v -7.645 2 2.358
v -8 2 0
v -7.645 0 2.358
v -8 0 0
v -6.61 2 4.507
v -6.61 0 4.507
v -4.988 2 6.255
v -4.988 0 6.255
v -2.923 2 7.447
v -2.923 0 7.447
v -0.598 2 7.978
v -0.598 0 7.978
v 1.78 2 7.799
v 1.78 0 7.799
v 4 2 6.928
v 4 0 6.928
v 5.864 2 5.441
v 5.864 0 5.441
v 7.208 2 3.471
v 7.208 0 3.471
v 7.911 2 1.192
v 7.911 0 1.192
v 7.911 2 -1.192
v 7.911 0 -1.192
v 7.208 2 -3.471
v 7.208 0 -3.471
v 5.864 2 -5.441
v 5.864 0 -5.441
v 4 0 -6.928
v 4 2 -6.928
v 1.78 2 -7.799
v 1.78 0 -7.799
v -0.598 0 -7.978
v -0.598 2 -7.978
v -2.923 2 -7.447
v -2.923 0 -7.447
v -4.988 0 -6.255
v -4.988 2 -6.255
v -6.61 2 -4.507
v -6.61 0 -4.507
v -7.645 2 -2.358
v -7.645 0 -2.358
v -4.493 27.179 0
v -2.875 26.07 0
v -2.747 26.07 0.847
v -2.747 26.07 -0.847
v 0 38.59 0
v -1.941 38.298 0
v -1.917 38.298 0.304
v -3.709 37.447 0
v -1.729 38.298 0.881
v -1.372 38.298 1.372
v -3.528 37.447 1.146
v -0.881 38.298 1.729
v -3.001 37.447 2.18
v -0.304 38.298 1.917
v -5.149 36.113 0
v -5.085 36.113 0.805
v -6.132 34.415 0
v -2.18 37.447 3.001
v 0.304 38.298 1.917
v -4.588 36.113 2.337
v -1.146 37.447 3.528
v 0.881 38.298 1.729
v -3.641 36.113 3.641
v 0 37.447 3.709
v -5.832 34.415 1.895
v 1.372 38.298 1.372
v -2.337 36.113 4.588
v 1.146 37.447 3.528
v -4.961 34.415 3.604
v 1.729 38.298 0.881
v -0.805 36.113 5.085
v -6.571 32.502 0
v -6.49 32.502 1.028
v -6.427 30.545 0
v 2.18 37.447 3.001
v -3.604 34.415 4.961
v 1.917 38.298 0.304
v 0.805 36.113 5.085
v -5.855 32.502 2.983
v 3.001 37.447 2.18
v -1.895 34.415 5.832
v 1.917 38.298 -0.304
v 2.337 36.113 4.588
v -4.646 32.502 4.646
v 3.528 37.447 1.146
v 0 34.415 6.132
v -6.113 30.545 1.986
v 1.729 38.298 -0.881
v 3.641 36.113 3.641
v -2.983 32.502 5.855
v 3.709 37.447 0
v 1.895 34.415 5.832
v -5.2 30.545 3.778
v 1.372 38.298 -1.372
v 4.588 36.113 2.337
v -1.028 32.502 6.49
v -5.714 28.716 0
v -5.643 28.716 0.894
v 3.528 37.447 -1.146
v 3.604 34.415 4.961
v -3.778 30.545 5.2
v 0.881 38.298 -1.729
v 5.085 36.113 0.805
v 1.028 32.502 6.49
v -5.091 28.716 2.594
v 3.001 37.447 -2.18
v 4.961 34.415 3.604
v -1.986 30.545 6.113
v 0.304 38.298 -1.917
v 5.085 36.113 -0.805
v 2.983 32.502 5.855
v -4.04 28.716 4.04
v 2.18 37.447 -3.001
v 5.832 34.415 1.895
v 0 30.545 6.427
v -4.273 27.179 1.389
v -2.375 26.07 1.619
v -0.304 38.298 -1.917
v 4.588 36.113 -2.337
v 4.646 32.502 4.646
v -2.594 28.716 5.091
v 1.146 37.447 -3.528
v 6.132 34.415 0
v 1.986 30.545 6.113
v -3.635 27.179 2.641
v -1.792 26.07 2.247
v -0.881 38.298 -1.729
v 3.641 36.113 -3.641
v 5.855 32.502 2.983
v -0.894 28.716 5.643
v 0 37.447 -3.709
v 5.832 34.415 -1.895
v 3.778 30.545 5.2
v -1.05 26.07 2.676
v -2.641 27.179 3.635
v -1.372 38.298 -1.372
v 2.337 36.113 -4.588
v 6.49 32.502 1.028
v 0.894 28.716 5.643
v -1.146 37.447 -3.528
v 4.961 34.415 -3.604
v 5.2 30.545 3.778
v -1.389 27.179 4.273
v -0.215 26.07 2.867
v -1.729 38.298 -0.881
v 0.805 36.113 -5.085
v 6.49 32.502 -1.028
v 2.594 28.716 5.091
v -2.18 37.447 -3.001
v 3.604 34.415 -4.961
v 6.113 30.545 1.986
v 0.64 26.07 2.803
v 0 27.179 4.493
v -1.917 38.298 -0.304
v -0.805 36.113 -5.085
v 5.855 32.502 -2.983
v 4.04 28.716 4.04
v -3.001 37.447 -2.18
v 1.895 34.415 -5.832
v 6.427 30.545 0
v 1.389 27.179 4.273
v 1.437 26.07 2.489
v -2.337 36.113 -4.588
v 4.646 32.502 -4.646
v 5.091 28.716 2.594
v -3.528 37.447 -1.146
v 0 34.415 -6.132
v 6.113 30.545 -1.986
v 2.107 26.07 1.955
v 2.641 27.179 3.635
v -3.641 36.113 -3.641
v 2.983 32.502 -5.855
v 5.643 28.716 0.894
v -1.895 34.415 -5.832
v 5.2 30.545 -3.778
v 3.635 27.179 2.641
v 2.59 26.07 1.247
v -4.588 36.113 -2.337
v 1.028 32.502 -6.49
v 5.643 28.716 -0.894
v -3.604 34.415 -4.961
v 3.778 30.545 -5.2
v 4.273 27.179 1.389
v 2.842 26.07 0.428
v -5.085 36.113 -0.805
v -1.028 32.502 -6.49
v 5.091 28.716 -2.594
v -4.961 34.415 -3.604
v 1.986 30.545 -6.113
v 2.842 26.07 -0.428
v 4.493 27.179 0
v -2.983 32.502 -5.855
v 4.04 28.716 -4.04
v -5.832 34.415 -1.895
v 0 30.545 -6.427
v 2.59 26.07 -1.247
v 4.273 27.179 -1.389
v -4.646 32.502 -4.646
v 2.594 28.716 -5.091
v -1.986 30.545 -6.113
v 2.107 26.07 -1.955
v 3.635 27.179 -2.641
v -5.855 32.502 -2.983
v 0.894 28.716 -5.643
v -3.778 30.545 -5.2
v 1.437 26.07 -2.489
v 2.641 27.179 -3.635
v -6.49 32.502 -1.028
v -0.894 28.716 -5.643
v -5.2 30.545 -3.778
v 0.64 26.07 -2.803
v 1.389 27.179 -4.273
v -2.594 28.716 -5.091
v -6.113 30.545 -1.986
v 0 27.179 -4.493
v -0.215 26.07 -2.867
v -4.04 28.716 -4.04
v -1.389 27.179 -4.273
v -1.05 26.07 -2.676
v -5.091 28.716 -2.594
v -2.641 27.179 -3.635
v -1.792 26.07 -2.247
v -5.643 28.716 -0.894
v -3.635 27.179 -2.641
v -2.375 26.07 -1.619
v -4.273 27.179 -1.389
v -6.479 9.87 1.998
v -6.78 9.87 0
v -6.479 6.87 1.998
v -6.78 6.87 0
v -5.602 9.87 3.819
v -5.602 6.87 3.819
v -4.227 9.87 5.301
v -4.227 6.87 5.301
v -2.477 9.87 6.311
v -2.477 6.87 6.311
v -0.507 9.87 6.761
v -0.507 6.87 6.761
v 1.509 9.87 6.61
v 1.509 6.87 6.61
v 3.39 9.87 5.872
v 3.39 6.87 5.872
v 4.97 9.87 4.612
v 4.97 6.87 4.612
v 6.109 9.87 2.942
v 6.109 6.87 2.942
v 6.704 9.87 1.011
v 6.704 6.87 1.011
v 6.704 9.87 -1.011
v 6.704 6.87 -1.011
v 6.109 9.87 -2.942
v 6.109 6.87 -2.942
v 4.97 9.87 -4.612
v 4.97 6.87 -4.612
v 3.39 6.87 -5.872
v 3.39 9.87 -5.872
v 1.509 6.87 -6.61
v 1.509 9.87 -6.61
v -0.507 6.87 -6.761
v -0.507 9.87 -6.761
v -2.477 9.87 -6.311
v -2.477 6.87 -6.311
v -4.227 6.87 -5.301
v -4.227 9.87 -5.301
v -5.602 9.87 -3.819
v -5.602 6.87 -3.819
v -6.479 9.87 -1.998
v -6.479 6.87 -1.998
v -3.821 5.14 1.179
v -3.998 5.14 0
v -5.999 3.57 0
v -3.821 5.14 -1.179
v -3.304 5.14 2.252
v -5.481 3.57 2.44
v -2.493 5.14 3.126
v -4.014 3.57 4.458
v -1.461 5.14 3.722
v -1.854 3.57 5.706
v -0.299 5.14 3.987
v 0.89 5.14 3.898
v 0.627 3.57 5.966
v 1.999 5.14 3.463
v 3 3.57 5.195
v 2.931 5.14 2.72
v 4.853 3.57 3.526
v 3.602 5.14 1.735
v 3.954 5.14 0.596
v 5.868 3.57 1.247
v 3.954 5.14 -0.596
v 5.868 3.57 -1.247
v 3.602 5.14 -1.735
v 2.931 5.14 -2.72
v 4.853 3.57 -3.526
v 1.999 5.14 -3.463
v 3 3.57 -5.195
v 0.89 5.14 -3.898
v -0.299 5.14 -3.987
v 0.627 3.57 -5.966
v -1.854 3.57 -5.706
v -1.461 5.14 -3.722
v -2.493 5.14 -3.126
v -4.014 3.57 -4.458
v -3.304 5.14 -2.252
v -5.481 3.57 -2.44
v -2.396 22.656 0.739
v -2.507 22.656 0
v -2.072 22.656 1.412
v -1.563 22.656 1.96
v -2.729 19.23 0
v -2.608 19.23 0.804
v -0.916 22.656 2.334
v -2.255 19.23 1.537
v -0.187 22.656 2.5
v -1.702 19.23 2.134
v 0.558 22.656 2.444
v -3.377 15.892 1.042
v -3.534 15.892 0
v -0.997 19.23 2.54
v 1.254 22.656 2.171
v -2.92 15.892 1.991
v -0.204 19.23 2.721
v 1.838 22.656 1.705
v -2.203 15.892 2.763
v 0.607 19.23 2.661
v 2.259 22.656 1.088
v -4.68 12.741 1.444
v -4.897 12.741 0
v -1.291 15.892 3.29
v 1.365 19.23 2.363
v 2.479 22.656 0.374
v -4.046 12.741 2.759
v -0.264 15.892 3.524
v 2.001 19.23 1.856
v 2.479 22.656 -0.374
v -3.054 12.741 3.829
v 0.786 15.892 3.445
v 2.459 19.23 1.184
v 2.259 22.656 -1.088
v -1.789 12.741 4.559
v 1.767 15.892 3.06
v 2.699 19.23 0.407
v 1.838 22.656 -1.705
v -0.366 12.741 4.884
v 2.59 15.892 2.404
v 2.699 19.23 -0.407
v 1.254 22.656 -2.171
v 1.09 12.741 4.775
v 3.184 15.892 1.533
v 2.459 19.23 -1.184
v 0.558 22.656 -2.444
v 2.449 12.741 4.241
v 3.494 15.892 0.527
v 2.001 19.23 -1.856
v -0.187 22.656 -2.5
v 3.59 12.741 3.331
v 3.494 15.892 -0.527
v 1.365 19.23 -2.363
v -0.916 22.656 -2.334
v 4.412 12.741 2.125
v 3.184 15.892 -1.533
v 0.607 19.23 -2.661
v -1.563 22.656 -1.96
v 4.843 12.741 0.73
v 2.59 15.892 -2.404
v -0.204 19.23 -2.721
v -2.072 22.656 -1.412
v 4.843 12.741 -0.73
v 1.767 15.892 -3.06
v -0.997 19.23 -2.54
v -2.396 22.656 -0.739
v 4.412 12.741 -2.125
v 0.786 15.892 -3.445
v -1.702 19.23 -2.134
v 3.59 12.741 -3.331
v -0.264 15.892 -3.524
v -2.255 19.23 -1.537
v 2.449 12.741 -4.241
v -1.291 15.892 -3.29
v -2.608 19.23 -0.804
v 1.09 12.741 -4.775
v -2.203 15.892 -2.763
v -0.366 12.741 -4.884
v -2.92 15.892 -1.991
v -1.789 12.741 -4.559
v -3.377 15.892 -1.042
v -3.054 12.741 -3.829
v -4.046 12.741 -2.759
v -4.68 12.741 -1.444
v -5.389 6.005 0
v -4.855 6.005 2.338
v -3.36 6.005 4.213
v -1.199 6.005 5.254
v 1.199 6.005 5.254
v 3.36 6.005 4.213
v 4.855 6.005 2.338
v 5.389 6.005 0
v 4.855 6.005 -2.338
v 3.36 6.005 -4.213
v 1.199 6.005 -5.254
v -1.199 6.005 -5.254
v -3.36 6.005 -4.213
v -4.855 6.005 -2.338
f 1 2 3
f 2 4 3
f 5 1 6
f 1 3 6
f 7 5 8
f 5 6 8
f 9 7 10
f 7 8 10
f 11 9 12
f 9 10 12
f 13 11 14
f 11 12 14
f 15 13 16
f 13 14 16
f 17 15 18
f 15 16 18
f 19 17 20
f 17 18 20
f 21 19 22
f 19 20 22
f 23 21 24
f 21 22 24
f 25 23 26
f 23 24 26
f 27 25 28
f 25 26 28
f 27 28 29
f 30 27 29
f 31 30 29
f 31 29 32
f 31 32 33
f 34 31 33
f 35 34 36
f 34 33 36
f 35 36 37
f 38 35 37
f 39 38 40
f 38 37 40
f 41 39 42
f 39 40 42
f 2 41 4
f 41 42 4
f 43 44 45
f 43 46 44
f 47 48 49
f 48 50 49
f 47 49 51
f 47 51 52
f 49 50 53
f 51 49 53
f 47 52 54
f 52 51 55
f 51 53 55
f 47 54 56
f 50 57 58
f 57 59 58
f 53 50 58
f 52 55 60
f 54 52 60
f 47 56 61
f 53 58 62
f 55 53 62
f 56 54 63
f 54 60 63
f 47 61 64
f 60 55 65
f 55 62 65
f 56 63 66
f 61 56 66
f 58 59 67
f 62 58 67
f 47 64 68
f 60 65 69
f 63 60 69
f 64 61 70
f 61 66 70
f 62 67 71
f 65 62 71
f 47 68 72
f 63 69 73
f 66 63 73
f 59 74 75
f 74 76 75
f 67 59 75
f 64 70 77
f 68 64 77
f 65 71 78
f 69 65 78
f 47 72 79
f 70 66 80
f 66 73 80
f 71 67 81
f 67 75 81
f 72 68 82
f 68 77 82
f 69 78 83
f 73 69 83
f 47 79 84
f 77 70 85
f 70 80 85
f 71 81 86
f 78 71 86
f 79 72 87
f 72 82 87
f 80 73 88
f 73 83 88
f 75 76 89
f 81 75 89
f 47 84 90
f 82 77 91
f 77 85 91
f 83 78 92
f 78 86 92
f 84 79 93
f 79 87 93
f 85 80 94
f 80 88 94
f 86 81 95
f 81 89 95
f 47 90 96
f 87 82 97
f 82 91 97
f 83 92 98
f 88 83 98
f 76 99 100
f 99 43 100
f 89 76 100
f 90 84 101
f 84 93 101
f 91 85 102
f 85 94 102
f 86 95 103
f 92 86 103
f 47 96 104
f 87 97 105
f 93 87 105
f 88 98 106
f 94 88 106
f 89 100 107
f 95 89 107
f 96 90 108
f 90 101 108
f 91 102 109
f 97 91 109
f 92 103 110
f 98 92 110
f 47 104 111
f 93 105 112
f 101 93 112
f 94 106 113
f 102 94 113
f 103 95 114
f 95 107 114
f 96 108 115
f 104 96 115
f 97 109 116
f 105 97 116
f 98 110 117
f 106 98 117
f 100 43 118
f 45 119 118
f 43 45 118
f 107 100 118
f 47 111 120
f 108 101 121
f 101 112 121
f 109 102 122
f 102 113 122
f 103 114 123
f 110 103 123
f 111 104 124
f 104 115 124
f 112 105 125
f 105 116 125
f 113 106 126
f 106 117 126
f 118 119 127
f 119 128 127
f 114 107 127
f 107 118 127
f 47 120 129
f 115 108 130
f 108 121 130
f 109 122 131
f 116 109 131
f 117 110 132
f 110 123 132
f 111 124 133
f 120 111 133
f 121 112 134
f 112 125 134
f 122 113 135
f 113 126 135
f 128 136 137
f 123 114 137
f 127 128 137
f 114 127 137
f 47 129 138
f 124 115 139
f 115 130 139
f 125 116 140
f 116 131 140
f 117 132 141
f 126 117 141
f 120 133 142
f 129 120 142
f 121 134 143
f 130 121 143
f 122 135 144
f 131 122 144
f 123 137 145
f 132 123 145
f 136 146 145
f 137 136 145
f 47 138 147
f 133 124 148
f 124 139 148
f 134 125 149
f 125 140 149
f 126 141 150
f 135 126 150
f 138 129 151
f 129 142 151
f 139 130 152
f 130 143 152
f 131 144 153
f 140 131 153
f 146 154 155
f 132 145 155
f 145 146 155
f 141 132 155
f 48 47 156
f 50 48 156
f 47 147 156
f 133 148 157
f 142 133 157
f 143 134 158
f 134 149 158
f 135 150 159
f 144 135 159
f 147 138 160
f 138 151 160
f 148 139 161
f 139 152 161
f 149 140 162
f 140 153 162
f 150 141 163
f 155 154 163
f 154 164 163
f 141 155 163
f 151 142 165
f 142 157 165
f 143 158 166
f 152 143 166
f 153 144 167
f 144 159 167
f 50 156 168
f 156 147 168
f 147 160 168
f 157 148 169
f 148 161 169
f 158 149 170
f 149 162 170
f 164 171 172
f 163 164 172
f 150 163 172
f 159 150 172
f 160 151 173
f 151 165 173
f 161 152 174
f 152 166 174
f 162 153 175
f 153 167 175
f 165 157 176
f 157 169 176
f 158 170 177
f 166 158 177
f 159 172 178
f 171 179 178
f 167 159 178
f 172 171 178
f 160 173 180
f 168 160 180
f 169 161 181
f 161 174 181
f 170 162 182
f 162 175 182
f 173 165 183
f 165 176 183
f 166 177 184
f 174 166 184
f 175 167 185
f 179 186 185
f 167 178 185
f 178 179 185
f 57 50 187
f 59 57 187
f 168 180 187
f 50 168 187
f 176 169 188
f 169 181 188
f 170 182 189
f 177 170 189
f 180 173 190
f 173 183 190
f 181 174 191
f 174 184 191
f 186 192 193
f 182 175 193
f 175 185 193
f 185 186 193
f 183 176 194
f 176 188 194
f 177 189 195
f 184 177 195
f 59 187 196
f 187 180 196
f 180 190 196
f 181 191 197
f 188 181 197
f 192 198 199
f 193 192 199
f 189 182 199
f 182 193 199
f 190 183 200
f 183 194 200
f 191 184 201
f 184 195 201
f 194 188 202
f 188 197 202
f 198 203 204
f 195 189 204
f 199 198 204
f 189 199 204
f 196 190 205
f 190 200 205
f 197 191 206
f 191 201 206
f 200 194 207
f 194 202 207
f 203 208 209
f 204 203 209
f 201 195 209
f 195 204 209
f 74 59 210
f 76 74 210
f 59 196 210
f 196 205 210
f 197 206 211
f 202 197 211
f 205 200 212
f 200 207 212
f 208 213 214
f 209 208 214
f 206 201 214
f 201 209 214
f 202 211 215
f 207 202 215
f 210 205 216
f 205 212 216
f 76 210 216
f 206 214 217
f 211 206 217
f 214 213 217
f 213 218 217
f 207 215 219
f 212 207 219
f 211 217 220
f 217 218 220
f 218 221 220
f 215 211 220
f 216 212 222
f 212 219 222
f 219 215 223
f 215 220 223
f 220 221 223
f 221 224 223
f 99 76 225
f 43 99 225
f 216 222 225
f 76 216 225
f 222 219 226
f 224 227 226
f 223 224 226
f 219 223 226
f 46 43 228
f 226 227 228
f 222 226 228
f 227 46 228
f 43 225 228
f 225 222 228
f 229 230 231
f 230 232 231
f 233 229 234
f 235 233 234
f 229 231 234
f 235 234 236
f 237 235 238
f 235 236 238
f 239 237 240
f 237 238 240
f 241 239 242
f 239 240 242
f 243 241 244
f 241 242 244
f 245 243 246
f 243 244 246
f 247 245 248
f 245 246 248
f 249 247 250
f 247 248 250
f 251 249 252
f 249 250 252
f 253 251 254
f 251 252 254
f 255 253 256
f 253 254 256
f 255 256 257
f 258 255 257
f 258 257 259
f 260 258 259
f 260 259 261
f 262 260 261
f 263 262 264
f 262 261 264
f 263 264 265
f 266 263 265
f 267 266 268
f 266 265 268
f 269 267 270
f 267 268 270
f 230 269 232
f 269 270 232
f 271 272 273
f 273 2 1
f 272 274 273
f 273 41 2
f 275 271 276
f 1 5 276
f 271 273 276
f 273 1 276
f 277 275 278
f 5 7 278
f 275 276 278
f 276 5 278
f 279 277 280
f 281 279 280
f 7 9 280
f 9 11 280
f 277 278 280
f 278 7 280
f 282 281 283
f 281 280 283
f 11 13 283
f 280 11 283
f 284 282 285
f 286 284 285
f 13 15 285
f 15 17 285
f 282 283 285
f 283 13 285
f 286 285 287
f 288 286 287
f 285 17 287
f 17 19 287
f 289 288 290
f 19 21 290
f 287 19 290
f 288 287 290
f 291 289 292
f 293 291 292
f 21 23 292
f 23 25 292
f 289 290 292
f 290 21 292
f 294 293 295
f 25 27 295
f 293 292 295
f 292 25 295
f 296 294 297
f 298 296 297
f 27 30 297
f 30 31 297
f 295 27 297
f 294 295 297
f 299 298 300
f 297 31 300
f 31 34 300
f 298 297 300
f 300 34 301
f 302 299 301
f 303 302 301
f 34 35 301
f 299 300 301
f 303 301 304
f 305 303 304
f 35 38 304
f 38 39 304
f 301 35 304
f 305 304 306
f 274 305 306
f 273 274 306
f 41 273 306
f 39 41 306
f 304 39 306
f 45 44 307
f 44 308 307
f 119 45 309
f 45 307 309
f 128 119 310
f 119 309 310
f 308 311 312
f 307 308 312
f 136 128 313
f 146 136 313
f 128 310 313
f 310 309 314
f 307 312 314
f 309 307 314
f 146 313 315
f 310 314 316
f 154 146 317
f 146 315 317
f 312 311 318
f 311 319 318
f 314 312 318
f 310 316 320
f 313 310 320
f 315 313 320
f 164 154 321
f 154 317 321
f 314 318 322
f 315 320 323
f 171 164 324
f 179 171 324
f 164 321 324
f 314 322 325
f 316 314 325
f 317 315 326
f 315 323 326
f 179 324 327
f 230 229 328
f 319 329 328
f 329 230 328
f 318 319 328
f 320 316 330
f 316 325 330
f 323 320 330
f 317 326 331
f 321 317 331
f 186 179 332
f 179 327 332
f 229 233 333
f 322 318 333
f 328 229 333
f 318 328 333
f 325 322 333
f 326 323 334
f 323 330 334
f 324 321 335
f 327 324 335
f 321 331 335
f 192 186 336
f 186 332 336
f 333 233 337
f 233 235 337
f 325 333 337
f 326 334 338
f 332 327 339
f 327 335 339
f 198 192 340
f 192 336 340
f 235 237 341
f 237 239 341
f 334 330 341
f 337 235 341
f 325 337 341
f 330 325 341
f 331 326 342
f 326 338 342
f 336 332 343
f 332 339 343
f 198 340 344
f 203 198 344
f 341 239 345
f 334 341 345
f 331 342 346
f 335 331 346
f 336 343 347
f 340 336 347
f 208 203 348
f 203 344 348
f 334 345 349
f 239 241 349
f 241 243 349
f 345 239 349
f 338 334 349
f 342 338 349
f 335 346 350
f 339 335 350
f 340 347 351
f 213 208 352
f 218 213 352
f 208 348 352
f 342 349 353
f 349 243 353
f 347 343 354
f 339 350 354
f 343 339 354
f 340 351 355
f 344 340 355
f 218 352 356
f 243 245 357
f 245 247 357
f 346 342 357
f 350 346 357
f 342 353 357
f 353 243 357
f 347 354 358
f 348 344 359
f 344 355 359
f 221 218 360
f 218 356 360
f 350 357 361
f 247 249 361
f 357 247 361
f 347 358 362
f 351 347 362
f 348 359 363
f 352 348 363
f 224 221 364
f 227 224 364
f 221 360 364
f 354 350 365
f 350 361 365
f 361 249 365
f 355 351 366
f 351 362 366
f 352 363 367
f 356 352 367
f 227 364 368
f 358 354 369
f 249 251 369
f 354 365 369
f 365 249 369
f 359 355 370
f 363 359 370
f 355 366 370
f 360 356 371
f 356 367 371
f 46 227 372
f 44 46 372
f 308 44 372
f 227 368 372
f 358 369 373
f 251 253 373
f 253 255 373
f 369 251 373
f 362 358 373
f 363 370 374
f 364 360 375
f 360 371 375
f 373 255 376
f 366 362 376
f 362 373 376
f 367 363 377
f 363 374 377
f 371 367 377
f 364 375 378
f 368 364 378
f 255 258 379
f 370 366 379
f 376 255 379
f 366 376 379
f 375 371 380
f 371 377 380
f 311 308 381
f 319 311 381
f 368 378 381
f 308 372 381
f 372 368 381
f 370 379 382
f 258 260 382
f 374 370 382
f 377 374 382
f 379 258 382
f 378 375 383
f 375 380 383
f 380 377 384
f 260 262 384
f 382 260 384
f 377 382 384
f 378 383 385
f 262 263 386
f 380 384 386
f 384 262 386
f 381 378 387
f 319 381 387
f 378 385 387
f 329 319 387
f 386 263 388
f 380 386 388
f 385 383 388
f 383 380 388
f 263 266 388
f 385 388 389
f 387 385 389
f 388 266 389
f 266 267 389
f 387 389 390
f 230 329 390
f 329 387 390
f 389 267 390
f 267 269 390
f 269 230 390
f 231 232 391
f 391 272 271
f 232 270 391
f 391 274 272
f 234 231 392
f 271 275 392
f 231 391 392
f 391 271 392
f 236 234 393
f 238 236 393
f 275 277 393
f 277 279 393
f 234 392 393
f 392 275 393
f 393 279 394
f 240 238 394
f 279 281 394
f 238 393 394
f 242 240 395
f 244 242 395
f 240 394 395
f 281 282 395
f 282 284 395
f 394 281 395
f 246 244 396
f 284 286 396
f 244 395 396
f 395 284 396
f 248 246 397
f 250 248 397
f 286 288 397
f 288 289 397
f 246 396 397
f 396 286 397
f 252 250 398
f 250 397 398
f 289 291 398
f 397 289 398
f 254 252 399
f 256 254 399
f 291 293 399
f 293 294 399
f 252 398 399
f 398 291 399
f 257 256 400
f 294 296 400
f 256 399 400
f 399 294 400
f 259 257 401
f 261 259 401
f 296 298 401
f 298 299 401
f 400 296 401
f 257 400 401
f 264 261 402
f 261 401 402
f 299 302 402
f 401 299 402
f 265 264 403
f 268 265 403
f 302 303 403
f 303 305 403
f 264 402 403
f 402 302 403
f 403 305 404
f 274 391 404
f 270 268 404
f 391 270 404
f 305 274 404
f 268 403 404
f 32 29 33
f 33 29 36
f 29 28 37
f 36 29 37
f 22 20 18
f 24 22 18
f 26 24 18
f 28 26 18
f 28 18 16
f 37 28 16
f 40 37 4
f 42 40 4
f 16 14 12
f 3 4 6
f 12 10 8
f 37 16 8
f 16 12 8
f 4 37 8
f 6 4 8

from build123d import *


with BuildPart() as f1:
    # F0 (on Top) → F1 (revolve)
    with BuildSketch(Plane.XY):
        with BuildLine():
            Line((-2.874578, 26.07), (0, 26.07))
            Line((0, 26.07), (0, 32))
            Line((0, 32), (0, 38.59))
            ThreePointArc((0, 38.59), (-6.422881, 33.474686), (-2.874578, 26.07))
        make_face()
        with BuildLine():
            Line((-8, 0), (0, 0))
            Line((0, 0), (0, 26.07))
            Line((0, 26.07), (-2.874578, 26.07))
            ThreePointArc((-2.874578, 26.07), (-3.059702, 17.543878), (-6.78, 9.87))
            Line((-6.78, 9.87), (-6.78, 6.87))
            Line((-6.78, 6.87), (-3.998394, 5.14))
            Line((-3.998394, 5.14), (-8, 2))
            Line((-8, 2), (-8, 0))
        make_face()
    revolve(axis=Axis((0, 19.295, 0), (0, 1, 0)))


solid = f1.part
